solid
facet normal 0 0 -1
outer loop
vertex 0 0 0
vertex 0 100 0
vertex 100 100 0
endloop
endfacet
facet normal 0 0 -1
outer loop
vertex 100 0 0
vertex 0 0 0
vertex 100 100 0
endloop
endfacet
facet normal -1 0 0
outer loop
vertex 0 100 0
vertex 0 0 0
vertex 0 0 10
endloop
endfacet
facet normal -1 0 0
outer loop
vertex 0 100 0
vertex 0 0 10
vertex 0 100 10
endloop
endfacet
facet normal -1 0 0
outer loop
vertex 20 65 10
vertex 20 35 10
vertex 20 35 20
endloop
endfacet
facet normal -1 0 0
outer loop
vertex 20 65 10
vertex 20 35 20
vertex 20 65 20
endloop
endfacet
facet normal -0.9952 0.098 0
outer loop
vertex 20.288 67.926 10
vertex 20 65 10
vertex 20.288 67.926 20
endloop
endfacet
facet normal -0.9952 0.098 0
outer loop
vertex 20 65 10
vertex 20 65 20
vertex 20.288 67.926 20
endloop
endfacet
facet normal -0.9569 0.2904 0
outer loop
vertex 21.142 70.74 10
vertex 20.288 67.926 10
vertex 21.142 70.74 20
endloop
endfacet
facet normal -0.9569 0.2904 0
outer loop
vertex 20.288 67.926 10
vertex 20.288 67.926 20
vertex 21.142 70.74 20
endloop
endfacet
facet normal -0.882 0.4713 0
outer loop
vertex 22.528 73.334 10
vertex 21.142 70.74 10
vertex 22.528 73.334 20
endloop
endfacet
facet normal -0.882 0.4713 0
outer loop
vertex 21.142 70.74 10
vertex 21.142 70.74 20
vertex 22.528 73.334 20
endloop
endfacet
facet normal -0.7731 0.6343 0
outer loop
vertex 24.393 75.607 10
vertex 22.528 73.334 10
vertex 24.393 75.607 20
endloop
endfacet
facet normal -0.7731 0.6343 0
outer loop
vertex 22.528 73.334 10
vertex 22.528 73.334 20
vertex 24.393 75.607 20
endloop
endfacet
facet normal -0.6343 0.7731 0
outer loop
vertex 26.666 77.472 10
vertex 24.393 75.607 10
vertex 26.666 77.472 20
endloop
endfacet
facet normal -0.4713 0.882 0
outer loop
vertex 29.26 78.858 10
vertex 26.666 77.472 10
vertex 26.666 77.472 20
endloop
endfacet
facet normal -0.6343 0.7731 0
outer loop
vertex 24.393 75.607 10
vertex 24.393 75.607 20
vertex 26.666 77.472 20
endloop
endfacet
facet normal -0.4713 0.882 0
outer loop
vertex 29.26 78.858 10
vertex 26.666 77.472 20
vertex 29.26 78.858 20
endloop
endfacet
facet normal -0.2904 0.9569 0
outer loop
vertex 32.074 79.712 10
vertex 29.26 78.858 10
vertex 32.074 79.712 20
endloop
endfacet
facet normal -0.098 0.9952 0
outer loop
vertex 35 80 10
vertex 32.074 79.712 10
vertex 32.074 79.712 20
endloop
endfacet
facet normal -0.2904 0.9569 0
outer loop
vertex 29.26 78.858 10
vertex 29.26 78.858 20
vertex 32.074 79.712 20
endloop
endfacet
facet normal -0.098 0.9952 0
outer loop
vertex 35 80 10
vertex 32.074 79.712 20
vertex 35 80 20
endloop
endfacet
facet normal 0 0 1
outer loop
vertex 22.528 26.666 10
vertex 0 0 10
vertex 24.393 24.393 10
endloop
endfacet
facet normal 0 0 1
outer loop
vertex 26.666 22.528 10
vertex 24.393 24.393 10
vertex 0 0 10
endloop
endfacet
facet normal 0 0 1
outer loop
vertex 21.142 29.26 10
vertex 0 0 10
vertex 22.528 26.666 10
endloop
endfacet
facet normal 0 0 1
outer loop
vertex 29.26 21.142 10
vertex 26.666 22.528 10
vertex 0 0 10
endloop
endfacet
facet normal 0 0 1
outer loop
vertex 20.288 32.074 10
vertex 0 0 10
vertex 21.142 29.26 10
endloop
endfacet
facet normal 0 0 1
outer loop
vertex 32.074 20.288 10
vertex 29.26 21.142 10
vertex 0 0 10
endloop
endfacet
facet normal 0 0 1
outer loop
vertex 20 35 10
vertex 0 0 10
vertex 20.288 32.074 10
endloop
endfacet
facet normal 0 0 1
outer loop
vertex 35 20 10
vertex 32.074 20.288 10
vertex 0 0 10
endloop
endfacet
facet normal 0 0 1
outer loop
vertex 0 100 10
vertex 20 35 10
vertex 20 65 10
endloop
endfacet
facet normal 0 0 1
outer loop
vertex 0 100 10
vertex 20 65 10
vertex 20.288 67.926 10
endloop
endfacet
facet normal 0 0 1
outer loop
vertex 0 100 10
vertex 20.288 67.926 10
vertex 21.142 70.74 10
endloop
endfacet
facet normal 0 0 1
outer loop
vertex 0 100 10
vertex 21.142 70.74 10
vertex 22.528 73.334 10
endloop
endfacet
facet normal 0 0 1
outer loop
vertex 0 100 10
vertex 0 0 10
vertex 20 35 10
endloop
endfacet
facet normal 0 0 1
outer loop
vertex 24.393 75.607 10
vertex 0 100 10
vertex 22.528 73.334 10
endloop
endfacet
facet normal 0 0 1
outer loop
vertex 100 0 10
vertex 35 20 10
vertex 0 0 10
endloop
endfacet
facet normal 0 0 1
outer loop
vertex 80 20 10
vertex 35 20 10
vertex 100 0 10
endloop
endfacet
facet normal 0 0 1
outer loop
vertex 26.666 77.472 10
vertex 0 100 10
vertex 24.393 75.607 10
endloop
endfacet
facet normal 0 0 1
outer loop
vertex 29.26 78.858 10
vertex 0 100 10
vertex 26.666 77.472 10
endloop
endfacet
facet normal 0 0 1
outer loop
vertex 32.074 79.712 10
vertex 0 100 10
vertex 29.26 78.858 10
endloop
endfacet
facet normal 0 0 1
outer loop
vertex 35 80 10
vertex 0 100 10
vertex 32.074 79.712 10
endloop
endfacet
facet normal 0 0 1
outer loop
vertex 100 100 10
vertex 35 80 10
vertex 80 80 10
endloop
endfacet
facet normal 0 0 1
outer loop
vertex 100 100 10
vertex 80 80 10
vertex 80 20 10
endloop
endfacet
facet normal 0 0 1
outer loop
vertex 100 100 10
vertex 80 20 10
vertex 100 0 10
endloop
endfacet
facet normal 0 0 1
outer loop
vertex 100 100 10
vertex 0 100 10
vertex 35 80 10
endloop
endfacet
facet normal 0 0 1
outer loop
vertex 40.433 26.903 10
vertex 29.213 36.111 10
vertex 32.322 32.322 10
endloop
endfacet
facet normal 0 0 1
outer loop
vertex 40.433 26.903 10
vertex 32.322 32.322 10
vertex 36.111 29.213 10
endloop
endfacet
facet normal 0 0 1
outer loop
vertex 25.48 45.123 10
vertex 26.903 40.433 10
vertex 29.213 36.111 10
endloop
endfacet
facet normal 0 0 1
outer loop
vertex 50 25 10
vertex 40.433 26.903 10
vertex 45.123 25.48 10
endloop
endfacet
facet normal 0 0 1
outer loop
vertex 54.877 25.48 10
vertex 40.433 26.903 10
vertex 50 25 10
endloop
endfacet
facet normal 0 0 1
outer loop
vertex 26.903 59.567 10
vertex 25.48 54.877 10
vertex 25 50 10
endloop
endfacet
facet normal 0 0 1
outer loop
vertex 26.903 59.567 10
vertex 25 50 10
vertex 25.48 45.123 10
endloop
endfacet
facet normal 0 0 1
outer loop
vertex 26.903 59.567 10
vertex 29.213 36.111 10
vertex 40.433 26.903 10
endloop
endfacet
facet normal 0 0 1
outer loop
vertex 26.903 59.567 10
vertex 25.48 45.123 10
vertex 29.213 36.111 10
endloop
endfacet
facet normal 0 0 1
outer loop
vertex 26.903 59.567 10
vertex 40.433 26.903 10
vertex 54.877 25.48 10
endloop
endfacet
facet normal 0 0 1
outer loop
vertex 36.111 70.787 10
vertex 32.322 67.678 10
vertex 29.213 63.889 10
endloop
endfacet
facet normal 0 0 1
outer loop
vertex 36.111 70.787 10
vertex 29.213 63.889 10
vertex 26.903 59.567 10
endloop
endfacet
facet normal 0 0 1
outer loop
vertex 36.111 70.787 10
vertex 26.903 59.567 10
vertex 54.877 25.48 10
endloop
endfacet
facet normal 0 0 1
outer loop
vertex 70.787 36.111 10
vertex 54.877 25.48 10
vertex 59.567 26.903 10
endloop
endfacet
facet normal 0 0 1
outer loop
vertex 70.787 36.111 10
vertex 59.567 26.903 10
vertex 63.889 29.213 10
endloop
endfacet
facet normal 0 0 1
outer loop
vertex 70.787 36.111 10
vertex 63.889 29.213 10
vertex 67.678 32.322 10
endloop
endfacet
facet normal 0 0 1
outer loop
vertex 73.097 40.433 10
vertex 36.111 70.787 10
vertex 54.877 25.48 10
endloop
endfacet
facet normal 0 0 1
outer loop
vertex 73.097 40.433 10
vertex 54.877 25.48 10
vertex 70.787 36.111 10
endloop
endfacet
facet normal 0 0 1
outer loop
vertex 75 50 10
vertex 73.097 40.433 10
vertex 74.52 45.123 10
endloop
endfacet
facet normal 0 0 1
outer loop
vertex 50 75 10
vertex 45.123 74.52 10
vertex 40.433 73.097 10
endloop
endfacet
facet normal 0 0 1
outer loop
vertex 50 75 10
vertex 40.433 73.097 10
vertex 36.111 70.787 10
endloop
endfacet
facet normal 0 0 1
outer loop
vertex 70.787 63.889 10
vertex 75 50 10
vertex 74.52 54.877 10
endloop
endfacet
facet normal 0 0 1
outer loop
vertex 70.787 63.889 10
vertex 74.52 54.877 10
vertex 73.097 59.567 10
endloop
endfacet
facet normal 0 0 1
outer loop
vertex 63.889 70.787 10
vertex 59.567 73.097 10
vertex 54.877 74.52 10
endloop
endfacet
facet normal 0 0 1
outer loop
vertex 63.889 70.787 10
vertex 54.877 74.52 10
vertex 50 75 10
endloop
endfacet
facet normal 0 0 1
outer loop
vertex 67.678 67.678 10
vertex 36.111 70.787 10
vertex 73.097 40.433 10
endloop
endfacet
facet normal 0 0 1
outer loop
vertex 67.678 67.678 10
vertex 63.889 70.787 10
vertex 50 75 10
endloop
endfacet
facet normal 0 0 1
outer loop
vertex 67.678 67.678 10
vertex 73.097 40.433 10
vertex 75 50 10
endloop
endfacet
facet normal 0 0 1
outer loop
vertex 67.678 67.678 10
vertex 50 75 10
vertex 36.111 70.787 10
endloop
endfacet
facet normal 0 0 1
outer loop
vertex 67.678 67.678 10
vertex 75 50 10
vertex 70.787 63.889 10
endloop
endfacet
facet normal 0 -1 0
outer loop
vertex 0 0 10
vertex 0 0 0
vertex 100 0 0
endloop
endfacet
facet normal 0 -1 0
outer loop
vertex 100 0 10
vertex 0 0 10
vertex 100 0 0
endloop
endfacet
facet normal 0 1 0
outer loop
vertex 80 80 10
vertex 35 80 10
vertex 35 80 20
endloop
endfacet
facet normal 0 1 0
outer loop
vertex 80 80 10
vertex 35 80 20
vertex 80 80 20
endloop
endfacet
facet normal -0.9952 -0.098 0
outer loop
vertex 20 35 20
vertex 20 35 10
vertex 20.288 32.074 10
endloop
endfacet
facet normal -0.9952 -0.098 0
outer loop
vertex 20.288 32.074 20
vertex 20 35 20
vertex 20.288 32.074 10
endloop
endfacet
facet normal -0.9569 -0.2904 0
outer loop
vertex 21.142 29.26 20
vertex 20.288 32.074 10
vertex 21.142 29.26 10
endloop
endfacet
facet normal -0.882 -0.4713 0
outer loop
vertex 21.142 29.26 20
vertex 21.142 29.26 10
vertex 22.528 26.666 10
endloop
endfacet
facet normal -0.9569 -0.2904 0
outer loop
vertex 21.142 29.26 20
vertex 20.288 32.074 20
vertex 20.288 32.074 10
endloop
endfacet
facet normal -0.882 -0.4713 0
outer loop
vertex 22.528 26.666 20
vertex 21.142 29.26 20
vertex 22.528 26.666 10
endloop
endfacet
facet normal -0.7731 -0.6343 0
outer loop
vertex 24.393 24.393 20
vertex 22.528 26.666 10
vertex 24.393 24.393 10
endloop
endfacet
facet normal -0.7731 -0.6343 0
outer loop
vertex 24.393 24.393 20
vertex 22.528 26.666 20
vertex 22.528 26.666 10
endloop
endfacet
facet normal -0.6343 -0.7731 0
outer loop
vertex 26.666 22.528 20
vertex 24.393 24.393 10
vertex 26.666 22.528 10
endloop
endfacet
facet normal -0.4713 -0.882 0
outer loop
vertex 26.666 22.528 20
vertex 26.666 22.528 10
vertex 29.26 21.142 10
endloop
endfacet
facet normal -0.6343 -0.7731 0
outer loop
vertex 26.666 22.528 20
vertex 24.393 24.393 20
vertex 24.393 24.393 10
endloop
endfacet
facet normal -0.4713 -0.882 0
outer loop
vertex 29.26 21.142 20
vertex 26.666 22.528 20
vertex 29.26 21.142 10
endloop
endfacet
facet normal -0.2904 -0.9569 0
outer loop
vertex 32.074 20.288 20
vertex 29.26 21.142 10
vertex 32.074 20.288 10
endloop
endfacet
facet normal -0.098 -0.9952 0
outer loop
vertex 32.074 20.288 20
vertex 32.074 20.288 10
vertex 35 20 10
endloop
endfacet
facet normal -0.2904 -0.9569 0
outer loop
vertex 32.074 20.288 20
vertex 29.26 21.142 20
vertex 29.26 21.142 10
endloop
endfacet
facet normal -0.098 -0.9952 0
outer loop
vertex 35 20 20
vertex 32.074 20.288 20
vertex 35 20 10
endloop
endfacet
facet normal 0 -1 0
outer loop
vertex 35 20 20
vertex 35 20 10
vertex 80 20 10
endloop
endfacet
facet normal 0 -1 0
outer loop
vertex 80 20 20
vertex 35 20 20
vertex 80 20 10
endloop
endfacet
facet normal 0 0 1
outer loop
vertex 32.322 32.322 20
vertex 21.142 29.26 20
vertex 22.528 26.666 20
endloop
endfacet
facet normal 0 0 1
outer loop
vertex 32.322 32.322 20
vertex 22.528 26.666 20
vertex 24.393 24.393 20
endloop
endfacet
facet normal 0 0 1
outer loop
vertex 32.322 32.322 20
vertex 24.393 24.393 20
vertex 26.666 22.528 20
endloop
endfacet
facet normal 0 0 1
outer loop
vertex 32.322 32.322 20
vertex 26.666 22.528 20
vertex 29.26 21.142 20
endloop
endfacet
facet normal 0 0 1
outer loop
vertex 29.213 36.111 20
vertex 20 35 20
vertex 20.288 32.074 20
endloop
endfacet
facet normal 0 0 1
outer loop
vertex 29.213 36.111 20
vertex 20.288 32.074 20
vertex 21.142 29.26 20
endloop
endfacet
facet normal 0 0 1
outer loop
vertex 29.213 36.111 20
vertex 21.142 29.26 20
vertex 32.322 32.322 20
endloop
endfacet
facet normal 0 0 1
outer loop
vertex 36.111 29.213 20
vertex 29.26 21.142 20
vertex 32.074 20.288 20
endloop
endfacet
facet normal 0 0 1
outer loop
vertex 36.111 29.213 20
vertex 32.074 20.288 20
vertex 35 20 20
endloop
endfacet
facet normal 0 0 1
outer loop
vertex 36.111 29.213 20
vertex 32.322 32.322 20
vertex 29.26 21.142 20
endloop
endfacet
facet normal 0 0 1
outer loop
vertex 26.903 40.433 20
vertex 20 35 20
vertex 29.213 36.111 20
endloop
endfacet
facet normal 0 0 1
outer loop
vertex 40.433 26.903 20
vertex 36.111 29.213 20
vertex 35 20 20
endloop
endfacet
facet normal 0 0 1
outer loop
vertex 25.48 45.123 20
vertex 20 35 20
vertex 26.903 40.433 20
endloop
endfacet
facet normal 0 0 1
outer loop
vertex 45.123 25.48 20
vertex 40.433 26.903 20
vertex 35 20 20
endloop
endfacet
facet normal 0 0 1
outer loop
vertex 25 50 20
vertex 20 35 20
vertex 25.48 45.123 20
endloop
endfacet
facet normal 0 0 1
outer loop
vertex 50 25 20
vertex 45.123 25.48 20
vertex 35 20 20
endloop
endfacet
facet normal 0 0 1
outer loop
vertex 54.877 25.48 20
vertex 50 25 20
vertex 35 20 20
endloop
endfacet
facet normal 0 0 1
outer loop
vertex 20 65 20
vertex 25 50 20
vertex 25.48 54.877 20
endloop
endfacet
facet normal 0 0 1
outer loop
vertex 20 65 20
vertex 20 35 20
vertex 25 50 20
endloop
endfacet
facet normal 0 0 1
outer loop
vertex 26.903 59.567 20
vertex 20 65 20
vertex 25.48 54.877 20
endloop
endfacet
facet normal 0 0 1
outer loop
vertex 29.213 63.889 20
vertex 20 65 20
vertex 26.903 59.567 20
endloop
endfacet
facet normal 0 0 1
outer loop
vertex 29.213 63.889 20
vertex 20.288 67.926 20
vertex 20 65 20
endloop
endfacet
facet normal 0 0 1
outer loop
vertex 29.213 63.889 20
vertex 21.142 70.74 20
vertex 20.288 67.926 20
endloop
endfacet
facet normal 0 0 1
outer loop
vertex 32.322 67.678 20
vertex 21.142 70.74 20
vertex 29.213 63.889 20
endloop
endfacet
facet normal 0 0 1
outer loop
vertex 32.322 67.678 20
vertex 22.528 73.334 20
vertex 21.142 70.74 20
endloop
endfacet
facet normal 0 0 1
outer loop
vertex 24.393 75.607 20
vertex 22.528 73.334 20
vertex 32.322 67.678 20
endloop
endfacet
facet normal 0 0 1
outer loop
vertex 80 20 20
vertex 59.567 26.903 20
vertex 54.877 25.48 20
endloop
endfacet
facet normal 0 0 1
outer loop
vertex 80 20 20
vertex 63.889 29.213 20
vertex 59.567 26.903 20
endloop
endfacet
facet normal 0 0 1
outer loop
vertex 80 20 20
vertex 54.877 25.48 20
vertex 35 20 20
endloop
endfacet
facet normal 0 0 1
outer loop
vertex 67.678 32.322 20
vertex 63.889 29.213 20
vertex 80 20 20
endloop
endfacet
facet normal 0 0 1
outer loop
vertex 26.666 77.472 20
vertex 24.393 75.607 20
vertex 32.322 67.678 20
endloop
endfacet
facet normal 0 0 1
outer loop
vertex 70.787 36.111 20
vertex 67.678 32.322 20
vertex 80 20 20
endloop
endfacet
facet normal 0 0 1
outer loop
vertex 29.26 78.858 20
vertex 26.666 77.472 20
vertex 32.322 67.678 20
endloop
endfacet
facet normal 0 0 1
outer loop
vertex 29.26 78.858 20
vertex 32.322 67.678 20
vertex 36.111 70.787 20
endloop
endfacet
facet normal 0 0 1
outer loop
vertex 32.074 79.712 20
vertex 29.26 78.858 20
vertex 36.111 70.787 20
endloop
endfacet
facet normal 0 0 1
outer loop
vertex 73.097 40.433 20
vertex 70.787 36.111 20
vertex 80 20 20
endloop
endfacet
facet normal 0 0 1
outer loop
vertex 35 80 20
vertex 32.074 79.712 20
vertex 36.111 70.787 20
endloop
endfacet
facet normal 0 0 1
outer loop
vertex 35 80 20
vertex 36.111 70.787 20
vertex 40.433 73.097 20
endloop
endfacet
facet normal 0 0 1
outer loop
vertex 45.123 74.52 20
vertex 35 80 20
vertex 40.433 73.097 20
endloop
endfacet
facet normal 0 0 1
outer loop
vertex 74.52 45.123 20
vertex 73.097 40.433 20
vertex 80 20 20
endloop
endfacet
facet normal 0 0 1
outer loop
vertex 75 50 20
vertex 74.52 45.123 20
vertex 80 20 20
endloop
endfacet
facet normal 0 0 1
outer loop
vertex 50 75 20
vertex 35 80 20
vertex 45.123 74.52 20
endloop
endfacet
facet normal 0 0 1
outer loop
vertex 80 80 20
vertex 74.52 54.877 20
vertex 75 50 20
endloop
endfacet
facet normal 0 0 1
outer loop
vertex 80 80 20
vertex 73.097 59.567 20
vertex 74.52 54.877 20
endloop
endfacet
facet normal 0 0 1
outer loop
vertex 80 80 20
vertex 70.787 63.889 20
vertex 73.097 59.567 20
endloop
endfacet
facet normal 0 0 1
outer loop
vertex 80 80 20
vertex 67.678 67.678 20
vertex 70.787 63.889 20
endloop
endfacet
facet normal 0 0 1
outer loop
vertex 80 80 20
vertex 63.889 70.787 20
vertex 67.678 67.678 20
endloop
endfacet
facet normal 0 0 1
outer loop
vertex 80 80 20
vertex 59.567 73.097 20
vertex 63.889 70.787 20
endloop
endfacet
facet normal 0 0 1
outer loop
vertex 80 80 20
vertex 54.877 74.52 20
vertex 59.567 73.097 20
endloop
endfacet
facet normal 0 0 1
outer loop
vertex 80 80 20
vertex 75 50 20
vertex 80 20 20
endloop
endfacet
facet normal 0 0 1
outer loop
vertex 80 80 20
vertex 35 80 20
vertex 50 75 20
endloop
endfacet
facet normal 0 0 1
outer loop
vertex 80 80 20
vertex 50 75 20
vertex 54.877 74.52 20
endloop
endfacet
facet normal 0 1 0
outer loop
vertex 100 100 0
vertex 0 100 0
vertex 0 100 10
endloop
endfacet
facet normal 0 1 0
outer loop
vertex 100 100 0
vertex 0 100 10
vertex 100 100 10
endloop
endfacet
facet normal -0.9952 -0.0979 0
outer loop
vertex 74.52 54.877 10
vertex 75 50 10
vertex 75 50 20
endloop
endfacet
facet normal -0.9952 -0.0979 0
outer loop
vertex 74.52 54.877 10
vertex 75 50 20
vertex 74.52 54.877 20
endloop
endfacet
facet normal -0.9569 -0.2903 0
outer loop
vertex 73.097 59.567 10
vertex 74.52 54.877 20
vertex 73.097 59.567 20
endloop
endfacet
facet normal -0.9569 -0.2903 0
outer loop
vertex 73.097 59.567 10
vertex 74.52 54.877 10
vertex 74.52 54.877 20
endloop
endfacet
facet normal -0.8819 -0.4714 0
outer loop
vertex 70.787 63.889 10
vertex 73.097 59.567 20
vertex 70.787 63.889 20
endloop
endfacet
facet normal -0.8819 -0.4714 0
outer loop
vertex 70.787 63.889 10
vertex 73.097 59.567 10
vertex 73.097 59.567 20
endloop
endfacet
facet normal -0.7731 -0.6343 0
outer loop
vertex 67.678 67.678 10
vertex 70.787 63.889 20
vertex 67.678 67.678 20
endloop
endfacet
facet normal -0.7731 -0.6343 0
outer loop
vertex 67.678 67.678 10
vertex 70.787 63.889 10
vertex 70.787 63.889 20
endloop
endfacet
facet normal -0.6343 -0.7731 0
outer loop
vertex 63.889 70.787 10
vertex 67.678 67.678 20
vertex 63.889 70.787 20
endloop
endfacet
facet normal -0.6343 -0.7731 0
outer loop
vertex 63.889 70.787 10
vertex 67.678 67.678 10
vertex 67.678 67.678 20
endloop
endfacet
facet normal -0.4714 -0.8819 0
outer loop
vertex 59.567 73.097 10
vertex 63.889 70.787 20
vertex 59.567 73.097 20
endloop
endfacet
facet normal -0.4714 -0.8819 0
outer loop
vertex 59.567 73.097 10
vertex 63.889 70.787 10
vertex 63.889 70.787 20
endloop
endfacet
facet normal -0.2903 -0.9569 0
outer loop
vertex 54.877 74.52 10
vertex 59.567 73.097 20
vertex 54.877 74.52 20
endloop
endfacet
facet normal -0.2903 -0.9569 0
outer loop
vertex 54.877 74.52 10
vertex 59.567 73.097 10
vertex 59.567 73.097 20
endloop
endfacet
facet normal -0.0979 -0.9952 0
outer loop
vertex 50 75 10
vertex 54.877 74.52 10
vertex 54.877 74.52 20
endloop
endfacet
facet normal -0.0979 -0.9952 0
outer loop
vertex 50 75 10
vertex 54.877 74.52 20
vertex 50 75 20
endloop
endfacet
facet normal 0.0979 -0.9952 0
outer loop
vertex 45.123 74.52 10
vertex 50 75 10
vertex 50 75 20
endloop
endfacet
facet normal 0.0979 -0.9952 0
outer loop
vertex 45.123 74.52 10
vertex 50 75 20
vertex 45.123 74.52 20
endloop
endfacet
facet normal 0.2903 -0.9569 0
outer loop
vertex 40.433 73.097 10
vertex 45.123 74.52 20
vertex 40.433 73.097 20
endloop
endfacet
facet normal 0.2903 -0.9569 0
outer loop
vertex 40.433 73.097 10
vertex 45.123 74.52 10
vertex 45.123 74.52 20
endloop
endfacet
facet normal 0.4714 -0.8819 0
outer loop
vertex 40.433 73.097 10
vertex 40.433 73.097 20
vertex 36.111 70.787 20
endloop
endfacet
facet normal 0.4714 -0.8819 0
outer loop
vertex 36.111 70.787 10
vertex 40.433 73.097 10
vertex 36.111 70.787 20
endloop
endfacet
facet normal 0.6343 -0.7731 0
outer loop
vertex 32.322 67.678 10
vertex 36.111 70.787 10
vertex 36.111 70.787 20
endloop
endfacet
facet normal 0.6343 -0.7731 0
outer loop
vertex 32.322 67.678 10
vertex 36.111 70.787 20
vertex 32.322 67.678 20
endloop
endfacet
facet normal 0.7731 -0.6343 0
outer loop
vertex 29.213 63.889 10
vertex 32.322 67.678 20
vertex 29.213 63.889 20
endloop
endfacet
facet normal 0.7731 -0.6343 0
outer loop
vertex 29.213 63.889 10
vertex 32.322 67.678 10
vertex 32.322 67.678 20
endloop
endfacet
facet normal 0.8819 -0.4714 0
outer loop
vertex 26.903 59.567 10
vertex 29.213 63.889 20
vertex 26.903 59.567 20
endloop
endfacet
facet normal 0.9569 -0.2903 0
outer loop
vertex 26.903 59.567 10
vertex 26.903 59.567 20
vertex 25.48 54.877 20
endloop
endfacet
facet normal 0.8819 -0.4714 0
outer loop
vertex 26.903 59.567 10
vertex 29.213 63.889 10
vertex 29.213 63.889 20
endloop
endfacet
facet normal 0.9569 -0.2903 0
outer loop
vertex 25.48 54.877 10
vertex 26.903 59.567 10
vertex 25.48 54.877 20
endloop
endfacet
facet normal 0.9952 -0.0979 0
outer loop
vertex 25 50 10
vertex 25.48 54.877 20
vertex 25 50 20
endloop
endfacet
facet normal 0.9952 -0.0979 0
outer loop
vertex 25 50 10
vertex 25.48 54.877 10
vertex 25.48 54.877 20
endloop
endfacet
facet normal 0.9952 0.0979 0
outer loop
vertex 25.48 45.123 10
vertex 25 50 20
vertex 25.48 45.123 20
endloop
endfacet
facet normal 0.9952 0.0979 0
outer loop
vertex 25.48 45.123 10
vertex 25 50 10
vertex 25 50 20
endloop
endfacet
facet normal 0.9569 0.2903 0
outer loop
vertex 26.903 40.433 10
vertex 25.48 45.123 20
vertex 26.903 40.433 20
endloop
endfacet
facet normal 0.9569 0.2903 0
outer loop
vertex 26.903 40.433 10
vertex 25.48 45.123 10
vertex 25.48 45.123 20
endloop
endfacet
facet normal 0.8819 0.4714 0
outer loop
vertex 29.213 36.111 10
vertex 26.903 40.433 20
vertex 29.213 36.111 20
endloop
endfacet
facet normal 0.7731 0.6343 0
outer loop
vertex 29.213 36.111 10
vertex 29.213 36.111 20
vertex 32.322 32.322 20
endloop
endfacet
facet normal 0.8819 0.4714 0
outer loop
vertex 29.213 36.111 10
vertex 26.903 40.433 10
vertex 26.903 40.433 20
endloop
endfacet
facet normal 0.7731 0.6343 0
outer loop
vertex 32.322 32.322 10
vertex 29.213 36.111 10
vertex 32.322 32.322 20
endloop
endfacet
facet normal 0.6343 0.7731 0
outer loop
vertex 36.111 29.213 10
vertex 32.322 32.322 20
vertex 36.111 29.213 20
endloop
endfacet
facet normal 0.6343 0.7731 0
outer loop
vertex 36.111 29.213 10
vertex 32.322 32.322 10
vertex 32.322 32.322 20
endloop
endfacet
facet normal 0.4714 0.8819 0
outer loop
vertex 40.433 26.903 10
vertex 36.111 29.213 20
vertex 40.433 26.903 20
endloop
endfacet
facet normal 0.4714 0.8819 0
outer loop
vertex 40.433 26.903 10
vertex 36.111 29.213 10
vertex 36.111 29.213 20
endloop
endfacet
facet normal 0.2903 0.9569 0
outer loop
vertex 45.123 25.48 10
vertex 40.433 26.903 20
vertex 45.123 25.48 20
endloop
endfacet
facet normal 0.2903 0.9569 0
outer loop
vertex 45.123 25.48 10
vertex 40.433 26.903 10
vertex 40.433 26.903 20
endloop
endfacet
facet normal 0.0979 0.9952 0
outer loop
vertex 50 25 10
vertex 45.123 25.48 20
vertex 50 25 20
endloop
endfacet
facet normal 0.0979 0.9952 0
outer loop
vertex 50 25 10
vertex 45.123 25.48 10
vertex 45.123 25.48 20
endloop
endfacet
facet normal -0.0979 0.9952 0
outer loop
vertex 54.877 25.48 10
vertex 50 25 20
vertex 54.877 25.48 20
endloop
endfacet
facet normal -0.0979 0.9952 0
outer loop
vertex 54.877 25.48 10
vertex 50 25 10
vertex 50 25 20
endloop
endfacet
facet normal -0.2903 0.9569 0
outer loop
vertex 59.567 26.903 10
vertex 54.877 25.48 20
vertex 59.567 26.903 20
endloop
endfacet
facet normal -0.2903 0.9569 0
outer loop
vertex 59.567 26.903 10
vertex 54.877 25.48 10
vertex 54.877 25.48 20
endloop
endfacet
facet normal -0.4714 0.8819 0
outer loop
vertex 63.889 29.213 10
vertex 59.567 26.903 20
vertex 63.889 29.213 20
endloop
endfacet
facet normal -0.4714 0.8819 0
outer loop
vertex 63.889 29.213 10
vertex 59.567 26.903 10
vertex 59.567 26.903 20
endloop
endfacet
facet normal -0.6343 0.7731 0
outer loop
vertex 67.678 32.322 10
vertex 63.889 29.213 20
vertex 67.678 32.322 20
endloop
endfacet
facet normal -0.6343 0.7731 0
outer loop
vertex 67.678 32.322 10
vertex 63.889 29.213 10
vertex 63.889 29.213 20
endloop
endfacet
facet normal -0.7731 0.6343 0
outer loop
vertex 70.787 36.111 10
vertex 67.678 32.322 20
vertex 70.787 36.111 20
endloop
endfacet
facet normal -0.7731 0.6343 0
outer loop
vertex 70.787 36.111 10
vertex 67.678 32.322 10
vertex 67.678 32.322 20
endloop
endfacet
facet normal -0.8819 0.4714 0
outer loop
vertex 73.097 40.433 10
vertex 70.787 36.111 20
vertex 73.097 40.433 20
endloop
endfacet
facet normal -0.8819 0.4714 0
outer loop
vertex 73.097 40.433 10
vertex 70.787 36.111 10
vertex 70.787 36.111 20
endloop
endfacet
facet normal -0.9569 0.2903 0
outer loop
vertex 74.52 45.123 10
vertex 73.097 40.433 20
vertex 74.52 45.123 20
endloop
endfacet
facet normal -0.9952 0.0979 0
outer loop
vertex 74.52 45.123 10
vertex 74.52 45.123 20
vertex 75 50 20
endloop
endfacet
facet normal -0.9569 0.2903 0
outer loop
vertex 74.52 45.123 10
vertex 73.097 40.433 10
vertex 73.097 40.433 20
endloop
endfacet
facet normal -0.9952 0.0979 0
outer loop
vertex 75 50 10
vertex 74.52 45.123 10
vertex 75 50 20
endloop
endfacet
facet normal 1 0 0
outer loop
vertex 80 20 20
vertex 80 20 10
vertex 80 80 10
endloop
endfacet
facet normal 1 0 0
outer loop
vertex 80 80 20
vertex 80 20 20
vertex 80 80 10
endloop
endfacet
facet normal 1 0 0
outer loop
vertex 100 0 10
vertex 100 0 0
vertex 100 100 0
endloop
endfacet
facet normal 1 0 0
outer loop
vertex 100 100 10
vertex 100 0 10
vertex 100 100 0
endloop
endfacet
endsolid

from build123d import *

# Parameters (mm, degrees)
BOX_W          = 100
BOX_H          = 100
BOX_DEPTH      = 10
CYLINDER_R     = 25
CYLINDER_DEPTH = 10
BOX001_W       = 60
BOX001_H       = 60
BOX001_DEPTH   = 10
FILLET_R       = 15


with BuildPart() as cube:
    # Box → Box (new body)
    with BuildSketch(Plane.XY):
        with Locations((50, 50)):
            Rectangle(BOX_W, BOX_H)
    extrude(amount=BOX_DEPTH)


with BuildPart() as cylinder:
    # Cylinder → Cylinder (new body)
    with BuildSketch(Plane(origin=(50, 50, 10), x_dir=(1, 0, 0), z_dir=(0, 0, 1))):
        Circle(CYLINDER_R)
    extrude(amount=CYLINDER_DEPTH)


with BuildPart() as model_fusion:
    # Box001 → Box001 (new body)
    with BuildSketch(Plane(origin=(20, 20, 10), x_dir=(1, 0, 0), z_dir=(0, 0, 1))):
        with Locations((30, 30)):
            Rectangle(BOX001_W, BOX001_H)
    extrude(amount=BOX001_DEPTH)

    # Fillet
    fillet_edges = [model_fusion.edges().sort_by_distance(p)[0] for p in [
        (20, 20, 15),
        (20, 80, 15),
    ]]
    fillet(fillet_edges, radius=FILLET_R)

    # Cut: cut Cylinder
    add(cylinder.part, mode=Mode.SUBTRACT)

    # Fusion: union Cube
    add(cube.part)


solid = model_fusion.part
